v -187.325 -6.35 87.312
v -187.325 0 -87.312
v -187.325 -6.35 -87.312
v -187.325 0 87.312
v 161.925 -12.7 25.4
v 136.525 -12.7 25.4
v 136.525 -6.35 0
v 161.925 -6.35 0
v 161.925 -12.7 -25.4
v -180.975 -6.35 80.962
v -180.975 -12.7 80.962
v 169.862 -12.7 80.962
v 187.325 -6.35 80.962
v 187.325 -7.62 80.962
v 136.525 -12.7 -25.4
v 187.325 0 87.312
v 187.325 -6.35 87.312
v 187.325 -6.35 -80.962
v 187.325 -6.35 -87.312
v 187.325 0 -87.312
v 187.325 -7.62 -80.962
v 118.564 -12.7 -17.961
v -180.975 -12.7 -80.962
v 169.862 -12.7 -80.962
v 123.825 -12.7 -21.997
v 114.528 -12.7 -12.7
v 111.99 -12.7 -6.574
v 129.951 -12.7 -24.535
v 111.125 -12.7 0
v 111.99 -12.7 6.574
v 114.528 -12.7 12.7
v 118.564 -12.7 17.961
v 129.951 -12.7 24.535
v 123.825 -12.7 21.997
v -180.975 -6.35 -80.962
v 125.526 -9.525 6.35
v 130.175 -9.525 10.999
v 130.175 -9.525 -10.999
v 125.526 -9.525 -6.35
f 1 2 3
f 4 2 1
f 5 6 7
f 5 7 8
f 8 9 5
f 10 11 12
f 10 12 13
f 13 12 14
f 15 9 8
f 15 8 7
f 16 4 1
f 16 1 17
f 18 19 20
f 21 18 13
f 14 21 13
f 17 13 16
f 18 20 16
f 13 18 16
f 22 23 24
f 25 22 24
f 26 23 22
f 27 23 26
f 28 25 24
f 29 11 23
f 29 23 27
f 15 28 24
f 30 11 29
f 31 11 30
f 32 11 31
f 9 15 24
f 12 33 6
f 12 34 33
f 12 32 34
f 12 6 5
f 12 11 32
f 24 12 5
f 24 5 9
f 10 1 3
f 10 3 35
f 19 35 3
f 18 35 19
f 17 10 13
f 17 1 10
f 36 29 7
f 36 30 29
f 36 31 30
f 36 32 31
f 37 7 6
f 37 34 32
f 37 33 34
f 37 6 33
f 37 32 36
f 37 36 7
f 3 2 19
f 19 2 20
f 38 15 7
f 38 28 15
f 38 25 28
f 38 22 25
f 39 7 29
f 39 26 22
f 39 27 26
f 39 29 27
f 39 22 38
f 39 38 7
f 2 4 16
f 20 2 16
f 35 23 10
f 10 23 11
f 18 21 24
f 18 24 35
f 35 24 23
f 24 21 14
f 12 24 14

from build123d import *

# Parameters (mm, degrees)
F0_W     = 374.65
F0_H     = 174.625
F1_DEPTH = 12.7
F2_W     = 350.8375
F2_H     = 6.35
F2_W_2   = 6.35
F2_H_2   = 161.925
F2_W_3   = 17.4625
F3_DEPTH = 6.35
F4_SIZE2 = 5.08
F4_SIZE  = 17.4625
F2_W_4   = 50.8
F2_H_3   = 50.8
F5_DEPTH = 6.35
F6_R     = 25.39999
F7_SIZE2 = 6.34999
F7_SIZE  = 25.39999


# Not quite as in the source:
# - a fillet or chamfer is up to 0.001 mm smaller than in the source, because OpenCascade refuses the exact size


with BuildPart() as f1:
    # F0 (on Front) → F1 (new body)
    with BuildSketch(Plane.XZ):
        Rectangle(F0_W, F0_H)
    extrude(amount=F1_DEPTH)

    # F2 (on face) → F3 (cut)
    with BuildSketch(Plane.XZ.offset(12.7)):
        with Locations((-5.55625, 84.1375)):
            Rectangle(F2_W, F2_H)
        with Locations((-184.15, 84.1375)):
            Rectangle(F2_W_2, F2_H)
        with Locations((-184.15, 0)):
            Rectangle(F2_W_2, F2_H_2)
        with Locations((-184.15, -84.1375)):
            Rectangle(F2_W_2, F2_H)
        with Locations((-5.55625, -84.1375)):
            Rectangle(F2_W, F2_H)
        with Locations((178.59375, -84.1375)):
            Rectangle(F2_W_3, F2_H)
        with Locations((178.59375, 84.1375)):
            Rectangle(F2_W_3, F2_H)
    extrude(amount=-F3_DEPTH, mode=Mode.SUBTRACT)

    # F4
    f4_edges = [f1.edges().sort_by_distance(p)[0] for p in [
        (187.325, -12.7, 0),
    ]]
    f4_side = f1.faces().sort_by_distance((3.175, -12.7, 0))[0]
    chamfer(f4_edges, length=F4_SIZE, length2=F4_SIZE2, reference=f4_side)

    # F2 (on face) → F5 (cut)
    with BuildSketch(Plane.XZ.offset(12.7)):
        with Locations((136.525, 0)):
            Rectangle(F2_W_4, F2_H_3)
    extrude(amount=-F5_DEPTH, mode=Mode.SUBTRACT)

    # F6 (radius 25.4 in the source; OpenCascade refuses exactly that, so slightly less here)
    f6_edges = [f1.edges().sort_by_distance(p)[0] for p in [
        (111.125, -9.525, -25.4),
        (111.125, -9.525, 25.4),
    ]]
    fillet(f6_edges, radius=F6_R)

    # F7 (size 25.4 and 6.35 in the source; OpenCascade refuses exactly that, so slightly less here)
    f7_edges = [f1.edges().sort_by_distance(p)[0] for p in [
        (118.564485, -6.35, -17.960515),
    ]]
    f7_side = f1.faces().sort_by_distance((138.896085, -6.35, 0))[0]
    chamfer(f7_edges, length=F7_SIZE, length2=F7_SIZE2, reference=f7_side)


solid = f1.part
